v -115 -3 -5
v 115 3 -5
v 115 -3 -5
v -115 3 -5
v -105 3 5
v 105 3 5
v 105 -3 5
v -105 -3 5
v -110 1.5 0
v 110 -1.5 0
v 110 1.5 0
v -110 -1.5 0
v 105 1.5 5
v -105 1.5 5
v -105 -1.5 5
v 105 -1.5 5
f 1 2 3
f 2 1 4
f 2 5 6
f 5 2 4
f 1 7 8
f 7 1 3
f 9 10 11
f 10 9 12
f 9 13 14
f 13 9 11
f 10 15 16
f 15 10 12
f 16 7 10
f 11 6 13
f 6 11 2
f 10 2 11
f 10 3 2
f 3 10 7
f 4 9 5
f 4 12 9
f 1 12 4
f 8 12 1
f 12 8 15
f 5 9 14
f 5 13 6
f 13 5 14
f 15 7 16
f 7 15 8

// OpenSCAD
module esquina(){
difference(){
cube([10,6,10],center=true);
translate([0,0,10])cube([20,3,20],center=true);
    rotate([0,45,0])translate([-10,-10,0])cube(20);
}
}
module interno(largo = 50){
difference(){
cube([largo,6,10],center=true);
translate([0,0,10])cube([largo+
    10,3,20],center=true);
}
}

module marco(largo = 30){
largo = largo-10;
translate([largo/2+5,0,0])esquina();
translate([-largo/2-5,0,0])mirror([1,0,0])esquina();
interno(largo);
}

marco(220);
